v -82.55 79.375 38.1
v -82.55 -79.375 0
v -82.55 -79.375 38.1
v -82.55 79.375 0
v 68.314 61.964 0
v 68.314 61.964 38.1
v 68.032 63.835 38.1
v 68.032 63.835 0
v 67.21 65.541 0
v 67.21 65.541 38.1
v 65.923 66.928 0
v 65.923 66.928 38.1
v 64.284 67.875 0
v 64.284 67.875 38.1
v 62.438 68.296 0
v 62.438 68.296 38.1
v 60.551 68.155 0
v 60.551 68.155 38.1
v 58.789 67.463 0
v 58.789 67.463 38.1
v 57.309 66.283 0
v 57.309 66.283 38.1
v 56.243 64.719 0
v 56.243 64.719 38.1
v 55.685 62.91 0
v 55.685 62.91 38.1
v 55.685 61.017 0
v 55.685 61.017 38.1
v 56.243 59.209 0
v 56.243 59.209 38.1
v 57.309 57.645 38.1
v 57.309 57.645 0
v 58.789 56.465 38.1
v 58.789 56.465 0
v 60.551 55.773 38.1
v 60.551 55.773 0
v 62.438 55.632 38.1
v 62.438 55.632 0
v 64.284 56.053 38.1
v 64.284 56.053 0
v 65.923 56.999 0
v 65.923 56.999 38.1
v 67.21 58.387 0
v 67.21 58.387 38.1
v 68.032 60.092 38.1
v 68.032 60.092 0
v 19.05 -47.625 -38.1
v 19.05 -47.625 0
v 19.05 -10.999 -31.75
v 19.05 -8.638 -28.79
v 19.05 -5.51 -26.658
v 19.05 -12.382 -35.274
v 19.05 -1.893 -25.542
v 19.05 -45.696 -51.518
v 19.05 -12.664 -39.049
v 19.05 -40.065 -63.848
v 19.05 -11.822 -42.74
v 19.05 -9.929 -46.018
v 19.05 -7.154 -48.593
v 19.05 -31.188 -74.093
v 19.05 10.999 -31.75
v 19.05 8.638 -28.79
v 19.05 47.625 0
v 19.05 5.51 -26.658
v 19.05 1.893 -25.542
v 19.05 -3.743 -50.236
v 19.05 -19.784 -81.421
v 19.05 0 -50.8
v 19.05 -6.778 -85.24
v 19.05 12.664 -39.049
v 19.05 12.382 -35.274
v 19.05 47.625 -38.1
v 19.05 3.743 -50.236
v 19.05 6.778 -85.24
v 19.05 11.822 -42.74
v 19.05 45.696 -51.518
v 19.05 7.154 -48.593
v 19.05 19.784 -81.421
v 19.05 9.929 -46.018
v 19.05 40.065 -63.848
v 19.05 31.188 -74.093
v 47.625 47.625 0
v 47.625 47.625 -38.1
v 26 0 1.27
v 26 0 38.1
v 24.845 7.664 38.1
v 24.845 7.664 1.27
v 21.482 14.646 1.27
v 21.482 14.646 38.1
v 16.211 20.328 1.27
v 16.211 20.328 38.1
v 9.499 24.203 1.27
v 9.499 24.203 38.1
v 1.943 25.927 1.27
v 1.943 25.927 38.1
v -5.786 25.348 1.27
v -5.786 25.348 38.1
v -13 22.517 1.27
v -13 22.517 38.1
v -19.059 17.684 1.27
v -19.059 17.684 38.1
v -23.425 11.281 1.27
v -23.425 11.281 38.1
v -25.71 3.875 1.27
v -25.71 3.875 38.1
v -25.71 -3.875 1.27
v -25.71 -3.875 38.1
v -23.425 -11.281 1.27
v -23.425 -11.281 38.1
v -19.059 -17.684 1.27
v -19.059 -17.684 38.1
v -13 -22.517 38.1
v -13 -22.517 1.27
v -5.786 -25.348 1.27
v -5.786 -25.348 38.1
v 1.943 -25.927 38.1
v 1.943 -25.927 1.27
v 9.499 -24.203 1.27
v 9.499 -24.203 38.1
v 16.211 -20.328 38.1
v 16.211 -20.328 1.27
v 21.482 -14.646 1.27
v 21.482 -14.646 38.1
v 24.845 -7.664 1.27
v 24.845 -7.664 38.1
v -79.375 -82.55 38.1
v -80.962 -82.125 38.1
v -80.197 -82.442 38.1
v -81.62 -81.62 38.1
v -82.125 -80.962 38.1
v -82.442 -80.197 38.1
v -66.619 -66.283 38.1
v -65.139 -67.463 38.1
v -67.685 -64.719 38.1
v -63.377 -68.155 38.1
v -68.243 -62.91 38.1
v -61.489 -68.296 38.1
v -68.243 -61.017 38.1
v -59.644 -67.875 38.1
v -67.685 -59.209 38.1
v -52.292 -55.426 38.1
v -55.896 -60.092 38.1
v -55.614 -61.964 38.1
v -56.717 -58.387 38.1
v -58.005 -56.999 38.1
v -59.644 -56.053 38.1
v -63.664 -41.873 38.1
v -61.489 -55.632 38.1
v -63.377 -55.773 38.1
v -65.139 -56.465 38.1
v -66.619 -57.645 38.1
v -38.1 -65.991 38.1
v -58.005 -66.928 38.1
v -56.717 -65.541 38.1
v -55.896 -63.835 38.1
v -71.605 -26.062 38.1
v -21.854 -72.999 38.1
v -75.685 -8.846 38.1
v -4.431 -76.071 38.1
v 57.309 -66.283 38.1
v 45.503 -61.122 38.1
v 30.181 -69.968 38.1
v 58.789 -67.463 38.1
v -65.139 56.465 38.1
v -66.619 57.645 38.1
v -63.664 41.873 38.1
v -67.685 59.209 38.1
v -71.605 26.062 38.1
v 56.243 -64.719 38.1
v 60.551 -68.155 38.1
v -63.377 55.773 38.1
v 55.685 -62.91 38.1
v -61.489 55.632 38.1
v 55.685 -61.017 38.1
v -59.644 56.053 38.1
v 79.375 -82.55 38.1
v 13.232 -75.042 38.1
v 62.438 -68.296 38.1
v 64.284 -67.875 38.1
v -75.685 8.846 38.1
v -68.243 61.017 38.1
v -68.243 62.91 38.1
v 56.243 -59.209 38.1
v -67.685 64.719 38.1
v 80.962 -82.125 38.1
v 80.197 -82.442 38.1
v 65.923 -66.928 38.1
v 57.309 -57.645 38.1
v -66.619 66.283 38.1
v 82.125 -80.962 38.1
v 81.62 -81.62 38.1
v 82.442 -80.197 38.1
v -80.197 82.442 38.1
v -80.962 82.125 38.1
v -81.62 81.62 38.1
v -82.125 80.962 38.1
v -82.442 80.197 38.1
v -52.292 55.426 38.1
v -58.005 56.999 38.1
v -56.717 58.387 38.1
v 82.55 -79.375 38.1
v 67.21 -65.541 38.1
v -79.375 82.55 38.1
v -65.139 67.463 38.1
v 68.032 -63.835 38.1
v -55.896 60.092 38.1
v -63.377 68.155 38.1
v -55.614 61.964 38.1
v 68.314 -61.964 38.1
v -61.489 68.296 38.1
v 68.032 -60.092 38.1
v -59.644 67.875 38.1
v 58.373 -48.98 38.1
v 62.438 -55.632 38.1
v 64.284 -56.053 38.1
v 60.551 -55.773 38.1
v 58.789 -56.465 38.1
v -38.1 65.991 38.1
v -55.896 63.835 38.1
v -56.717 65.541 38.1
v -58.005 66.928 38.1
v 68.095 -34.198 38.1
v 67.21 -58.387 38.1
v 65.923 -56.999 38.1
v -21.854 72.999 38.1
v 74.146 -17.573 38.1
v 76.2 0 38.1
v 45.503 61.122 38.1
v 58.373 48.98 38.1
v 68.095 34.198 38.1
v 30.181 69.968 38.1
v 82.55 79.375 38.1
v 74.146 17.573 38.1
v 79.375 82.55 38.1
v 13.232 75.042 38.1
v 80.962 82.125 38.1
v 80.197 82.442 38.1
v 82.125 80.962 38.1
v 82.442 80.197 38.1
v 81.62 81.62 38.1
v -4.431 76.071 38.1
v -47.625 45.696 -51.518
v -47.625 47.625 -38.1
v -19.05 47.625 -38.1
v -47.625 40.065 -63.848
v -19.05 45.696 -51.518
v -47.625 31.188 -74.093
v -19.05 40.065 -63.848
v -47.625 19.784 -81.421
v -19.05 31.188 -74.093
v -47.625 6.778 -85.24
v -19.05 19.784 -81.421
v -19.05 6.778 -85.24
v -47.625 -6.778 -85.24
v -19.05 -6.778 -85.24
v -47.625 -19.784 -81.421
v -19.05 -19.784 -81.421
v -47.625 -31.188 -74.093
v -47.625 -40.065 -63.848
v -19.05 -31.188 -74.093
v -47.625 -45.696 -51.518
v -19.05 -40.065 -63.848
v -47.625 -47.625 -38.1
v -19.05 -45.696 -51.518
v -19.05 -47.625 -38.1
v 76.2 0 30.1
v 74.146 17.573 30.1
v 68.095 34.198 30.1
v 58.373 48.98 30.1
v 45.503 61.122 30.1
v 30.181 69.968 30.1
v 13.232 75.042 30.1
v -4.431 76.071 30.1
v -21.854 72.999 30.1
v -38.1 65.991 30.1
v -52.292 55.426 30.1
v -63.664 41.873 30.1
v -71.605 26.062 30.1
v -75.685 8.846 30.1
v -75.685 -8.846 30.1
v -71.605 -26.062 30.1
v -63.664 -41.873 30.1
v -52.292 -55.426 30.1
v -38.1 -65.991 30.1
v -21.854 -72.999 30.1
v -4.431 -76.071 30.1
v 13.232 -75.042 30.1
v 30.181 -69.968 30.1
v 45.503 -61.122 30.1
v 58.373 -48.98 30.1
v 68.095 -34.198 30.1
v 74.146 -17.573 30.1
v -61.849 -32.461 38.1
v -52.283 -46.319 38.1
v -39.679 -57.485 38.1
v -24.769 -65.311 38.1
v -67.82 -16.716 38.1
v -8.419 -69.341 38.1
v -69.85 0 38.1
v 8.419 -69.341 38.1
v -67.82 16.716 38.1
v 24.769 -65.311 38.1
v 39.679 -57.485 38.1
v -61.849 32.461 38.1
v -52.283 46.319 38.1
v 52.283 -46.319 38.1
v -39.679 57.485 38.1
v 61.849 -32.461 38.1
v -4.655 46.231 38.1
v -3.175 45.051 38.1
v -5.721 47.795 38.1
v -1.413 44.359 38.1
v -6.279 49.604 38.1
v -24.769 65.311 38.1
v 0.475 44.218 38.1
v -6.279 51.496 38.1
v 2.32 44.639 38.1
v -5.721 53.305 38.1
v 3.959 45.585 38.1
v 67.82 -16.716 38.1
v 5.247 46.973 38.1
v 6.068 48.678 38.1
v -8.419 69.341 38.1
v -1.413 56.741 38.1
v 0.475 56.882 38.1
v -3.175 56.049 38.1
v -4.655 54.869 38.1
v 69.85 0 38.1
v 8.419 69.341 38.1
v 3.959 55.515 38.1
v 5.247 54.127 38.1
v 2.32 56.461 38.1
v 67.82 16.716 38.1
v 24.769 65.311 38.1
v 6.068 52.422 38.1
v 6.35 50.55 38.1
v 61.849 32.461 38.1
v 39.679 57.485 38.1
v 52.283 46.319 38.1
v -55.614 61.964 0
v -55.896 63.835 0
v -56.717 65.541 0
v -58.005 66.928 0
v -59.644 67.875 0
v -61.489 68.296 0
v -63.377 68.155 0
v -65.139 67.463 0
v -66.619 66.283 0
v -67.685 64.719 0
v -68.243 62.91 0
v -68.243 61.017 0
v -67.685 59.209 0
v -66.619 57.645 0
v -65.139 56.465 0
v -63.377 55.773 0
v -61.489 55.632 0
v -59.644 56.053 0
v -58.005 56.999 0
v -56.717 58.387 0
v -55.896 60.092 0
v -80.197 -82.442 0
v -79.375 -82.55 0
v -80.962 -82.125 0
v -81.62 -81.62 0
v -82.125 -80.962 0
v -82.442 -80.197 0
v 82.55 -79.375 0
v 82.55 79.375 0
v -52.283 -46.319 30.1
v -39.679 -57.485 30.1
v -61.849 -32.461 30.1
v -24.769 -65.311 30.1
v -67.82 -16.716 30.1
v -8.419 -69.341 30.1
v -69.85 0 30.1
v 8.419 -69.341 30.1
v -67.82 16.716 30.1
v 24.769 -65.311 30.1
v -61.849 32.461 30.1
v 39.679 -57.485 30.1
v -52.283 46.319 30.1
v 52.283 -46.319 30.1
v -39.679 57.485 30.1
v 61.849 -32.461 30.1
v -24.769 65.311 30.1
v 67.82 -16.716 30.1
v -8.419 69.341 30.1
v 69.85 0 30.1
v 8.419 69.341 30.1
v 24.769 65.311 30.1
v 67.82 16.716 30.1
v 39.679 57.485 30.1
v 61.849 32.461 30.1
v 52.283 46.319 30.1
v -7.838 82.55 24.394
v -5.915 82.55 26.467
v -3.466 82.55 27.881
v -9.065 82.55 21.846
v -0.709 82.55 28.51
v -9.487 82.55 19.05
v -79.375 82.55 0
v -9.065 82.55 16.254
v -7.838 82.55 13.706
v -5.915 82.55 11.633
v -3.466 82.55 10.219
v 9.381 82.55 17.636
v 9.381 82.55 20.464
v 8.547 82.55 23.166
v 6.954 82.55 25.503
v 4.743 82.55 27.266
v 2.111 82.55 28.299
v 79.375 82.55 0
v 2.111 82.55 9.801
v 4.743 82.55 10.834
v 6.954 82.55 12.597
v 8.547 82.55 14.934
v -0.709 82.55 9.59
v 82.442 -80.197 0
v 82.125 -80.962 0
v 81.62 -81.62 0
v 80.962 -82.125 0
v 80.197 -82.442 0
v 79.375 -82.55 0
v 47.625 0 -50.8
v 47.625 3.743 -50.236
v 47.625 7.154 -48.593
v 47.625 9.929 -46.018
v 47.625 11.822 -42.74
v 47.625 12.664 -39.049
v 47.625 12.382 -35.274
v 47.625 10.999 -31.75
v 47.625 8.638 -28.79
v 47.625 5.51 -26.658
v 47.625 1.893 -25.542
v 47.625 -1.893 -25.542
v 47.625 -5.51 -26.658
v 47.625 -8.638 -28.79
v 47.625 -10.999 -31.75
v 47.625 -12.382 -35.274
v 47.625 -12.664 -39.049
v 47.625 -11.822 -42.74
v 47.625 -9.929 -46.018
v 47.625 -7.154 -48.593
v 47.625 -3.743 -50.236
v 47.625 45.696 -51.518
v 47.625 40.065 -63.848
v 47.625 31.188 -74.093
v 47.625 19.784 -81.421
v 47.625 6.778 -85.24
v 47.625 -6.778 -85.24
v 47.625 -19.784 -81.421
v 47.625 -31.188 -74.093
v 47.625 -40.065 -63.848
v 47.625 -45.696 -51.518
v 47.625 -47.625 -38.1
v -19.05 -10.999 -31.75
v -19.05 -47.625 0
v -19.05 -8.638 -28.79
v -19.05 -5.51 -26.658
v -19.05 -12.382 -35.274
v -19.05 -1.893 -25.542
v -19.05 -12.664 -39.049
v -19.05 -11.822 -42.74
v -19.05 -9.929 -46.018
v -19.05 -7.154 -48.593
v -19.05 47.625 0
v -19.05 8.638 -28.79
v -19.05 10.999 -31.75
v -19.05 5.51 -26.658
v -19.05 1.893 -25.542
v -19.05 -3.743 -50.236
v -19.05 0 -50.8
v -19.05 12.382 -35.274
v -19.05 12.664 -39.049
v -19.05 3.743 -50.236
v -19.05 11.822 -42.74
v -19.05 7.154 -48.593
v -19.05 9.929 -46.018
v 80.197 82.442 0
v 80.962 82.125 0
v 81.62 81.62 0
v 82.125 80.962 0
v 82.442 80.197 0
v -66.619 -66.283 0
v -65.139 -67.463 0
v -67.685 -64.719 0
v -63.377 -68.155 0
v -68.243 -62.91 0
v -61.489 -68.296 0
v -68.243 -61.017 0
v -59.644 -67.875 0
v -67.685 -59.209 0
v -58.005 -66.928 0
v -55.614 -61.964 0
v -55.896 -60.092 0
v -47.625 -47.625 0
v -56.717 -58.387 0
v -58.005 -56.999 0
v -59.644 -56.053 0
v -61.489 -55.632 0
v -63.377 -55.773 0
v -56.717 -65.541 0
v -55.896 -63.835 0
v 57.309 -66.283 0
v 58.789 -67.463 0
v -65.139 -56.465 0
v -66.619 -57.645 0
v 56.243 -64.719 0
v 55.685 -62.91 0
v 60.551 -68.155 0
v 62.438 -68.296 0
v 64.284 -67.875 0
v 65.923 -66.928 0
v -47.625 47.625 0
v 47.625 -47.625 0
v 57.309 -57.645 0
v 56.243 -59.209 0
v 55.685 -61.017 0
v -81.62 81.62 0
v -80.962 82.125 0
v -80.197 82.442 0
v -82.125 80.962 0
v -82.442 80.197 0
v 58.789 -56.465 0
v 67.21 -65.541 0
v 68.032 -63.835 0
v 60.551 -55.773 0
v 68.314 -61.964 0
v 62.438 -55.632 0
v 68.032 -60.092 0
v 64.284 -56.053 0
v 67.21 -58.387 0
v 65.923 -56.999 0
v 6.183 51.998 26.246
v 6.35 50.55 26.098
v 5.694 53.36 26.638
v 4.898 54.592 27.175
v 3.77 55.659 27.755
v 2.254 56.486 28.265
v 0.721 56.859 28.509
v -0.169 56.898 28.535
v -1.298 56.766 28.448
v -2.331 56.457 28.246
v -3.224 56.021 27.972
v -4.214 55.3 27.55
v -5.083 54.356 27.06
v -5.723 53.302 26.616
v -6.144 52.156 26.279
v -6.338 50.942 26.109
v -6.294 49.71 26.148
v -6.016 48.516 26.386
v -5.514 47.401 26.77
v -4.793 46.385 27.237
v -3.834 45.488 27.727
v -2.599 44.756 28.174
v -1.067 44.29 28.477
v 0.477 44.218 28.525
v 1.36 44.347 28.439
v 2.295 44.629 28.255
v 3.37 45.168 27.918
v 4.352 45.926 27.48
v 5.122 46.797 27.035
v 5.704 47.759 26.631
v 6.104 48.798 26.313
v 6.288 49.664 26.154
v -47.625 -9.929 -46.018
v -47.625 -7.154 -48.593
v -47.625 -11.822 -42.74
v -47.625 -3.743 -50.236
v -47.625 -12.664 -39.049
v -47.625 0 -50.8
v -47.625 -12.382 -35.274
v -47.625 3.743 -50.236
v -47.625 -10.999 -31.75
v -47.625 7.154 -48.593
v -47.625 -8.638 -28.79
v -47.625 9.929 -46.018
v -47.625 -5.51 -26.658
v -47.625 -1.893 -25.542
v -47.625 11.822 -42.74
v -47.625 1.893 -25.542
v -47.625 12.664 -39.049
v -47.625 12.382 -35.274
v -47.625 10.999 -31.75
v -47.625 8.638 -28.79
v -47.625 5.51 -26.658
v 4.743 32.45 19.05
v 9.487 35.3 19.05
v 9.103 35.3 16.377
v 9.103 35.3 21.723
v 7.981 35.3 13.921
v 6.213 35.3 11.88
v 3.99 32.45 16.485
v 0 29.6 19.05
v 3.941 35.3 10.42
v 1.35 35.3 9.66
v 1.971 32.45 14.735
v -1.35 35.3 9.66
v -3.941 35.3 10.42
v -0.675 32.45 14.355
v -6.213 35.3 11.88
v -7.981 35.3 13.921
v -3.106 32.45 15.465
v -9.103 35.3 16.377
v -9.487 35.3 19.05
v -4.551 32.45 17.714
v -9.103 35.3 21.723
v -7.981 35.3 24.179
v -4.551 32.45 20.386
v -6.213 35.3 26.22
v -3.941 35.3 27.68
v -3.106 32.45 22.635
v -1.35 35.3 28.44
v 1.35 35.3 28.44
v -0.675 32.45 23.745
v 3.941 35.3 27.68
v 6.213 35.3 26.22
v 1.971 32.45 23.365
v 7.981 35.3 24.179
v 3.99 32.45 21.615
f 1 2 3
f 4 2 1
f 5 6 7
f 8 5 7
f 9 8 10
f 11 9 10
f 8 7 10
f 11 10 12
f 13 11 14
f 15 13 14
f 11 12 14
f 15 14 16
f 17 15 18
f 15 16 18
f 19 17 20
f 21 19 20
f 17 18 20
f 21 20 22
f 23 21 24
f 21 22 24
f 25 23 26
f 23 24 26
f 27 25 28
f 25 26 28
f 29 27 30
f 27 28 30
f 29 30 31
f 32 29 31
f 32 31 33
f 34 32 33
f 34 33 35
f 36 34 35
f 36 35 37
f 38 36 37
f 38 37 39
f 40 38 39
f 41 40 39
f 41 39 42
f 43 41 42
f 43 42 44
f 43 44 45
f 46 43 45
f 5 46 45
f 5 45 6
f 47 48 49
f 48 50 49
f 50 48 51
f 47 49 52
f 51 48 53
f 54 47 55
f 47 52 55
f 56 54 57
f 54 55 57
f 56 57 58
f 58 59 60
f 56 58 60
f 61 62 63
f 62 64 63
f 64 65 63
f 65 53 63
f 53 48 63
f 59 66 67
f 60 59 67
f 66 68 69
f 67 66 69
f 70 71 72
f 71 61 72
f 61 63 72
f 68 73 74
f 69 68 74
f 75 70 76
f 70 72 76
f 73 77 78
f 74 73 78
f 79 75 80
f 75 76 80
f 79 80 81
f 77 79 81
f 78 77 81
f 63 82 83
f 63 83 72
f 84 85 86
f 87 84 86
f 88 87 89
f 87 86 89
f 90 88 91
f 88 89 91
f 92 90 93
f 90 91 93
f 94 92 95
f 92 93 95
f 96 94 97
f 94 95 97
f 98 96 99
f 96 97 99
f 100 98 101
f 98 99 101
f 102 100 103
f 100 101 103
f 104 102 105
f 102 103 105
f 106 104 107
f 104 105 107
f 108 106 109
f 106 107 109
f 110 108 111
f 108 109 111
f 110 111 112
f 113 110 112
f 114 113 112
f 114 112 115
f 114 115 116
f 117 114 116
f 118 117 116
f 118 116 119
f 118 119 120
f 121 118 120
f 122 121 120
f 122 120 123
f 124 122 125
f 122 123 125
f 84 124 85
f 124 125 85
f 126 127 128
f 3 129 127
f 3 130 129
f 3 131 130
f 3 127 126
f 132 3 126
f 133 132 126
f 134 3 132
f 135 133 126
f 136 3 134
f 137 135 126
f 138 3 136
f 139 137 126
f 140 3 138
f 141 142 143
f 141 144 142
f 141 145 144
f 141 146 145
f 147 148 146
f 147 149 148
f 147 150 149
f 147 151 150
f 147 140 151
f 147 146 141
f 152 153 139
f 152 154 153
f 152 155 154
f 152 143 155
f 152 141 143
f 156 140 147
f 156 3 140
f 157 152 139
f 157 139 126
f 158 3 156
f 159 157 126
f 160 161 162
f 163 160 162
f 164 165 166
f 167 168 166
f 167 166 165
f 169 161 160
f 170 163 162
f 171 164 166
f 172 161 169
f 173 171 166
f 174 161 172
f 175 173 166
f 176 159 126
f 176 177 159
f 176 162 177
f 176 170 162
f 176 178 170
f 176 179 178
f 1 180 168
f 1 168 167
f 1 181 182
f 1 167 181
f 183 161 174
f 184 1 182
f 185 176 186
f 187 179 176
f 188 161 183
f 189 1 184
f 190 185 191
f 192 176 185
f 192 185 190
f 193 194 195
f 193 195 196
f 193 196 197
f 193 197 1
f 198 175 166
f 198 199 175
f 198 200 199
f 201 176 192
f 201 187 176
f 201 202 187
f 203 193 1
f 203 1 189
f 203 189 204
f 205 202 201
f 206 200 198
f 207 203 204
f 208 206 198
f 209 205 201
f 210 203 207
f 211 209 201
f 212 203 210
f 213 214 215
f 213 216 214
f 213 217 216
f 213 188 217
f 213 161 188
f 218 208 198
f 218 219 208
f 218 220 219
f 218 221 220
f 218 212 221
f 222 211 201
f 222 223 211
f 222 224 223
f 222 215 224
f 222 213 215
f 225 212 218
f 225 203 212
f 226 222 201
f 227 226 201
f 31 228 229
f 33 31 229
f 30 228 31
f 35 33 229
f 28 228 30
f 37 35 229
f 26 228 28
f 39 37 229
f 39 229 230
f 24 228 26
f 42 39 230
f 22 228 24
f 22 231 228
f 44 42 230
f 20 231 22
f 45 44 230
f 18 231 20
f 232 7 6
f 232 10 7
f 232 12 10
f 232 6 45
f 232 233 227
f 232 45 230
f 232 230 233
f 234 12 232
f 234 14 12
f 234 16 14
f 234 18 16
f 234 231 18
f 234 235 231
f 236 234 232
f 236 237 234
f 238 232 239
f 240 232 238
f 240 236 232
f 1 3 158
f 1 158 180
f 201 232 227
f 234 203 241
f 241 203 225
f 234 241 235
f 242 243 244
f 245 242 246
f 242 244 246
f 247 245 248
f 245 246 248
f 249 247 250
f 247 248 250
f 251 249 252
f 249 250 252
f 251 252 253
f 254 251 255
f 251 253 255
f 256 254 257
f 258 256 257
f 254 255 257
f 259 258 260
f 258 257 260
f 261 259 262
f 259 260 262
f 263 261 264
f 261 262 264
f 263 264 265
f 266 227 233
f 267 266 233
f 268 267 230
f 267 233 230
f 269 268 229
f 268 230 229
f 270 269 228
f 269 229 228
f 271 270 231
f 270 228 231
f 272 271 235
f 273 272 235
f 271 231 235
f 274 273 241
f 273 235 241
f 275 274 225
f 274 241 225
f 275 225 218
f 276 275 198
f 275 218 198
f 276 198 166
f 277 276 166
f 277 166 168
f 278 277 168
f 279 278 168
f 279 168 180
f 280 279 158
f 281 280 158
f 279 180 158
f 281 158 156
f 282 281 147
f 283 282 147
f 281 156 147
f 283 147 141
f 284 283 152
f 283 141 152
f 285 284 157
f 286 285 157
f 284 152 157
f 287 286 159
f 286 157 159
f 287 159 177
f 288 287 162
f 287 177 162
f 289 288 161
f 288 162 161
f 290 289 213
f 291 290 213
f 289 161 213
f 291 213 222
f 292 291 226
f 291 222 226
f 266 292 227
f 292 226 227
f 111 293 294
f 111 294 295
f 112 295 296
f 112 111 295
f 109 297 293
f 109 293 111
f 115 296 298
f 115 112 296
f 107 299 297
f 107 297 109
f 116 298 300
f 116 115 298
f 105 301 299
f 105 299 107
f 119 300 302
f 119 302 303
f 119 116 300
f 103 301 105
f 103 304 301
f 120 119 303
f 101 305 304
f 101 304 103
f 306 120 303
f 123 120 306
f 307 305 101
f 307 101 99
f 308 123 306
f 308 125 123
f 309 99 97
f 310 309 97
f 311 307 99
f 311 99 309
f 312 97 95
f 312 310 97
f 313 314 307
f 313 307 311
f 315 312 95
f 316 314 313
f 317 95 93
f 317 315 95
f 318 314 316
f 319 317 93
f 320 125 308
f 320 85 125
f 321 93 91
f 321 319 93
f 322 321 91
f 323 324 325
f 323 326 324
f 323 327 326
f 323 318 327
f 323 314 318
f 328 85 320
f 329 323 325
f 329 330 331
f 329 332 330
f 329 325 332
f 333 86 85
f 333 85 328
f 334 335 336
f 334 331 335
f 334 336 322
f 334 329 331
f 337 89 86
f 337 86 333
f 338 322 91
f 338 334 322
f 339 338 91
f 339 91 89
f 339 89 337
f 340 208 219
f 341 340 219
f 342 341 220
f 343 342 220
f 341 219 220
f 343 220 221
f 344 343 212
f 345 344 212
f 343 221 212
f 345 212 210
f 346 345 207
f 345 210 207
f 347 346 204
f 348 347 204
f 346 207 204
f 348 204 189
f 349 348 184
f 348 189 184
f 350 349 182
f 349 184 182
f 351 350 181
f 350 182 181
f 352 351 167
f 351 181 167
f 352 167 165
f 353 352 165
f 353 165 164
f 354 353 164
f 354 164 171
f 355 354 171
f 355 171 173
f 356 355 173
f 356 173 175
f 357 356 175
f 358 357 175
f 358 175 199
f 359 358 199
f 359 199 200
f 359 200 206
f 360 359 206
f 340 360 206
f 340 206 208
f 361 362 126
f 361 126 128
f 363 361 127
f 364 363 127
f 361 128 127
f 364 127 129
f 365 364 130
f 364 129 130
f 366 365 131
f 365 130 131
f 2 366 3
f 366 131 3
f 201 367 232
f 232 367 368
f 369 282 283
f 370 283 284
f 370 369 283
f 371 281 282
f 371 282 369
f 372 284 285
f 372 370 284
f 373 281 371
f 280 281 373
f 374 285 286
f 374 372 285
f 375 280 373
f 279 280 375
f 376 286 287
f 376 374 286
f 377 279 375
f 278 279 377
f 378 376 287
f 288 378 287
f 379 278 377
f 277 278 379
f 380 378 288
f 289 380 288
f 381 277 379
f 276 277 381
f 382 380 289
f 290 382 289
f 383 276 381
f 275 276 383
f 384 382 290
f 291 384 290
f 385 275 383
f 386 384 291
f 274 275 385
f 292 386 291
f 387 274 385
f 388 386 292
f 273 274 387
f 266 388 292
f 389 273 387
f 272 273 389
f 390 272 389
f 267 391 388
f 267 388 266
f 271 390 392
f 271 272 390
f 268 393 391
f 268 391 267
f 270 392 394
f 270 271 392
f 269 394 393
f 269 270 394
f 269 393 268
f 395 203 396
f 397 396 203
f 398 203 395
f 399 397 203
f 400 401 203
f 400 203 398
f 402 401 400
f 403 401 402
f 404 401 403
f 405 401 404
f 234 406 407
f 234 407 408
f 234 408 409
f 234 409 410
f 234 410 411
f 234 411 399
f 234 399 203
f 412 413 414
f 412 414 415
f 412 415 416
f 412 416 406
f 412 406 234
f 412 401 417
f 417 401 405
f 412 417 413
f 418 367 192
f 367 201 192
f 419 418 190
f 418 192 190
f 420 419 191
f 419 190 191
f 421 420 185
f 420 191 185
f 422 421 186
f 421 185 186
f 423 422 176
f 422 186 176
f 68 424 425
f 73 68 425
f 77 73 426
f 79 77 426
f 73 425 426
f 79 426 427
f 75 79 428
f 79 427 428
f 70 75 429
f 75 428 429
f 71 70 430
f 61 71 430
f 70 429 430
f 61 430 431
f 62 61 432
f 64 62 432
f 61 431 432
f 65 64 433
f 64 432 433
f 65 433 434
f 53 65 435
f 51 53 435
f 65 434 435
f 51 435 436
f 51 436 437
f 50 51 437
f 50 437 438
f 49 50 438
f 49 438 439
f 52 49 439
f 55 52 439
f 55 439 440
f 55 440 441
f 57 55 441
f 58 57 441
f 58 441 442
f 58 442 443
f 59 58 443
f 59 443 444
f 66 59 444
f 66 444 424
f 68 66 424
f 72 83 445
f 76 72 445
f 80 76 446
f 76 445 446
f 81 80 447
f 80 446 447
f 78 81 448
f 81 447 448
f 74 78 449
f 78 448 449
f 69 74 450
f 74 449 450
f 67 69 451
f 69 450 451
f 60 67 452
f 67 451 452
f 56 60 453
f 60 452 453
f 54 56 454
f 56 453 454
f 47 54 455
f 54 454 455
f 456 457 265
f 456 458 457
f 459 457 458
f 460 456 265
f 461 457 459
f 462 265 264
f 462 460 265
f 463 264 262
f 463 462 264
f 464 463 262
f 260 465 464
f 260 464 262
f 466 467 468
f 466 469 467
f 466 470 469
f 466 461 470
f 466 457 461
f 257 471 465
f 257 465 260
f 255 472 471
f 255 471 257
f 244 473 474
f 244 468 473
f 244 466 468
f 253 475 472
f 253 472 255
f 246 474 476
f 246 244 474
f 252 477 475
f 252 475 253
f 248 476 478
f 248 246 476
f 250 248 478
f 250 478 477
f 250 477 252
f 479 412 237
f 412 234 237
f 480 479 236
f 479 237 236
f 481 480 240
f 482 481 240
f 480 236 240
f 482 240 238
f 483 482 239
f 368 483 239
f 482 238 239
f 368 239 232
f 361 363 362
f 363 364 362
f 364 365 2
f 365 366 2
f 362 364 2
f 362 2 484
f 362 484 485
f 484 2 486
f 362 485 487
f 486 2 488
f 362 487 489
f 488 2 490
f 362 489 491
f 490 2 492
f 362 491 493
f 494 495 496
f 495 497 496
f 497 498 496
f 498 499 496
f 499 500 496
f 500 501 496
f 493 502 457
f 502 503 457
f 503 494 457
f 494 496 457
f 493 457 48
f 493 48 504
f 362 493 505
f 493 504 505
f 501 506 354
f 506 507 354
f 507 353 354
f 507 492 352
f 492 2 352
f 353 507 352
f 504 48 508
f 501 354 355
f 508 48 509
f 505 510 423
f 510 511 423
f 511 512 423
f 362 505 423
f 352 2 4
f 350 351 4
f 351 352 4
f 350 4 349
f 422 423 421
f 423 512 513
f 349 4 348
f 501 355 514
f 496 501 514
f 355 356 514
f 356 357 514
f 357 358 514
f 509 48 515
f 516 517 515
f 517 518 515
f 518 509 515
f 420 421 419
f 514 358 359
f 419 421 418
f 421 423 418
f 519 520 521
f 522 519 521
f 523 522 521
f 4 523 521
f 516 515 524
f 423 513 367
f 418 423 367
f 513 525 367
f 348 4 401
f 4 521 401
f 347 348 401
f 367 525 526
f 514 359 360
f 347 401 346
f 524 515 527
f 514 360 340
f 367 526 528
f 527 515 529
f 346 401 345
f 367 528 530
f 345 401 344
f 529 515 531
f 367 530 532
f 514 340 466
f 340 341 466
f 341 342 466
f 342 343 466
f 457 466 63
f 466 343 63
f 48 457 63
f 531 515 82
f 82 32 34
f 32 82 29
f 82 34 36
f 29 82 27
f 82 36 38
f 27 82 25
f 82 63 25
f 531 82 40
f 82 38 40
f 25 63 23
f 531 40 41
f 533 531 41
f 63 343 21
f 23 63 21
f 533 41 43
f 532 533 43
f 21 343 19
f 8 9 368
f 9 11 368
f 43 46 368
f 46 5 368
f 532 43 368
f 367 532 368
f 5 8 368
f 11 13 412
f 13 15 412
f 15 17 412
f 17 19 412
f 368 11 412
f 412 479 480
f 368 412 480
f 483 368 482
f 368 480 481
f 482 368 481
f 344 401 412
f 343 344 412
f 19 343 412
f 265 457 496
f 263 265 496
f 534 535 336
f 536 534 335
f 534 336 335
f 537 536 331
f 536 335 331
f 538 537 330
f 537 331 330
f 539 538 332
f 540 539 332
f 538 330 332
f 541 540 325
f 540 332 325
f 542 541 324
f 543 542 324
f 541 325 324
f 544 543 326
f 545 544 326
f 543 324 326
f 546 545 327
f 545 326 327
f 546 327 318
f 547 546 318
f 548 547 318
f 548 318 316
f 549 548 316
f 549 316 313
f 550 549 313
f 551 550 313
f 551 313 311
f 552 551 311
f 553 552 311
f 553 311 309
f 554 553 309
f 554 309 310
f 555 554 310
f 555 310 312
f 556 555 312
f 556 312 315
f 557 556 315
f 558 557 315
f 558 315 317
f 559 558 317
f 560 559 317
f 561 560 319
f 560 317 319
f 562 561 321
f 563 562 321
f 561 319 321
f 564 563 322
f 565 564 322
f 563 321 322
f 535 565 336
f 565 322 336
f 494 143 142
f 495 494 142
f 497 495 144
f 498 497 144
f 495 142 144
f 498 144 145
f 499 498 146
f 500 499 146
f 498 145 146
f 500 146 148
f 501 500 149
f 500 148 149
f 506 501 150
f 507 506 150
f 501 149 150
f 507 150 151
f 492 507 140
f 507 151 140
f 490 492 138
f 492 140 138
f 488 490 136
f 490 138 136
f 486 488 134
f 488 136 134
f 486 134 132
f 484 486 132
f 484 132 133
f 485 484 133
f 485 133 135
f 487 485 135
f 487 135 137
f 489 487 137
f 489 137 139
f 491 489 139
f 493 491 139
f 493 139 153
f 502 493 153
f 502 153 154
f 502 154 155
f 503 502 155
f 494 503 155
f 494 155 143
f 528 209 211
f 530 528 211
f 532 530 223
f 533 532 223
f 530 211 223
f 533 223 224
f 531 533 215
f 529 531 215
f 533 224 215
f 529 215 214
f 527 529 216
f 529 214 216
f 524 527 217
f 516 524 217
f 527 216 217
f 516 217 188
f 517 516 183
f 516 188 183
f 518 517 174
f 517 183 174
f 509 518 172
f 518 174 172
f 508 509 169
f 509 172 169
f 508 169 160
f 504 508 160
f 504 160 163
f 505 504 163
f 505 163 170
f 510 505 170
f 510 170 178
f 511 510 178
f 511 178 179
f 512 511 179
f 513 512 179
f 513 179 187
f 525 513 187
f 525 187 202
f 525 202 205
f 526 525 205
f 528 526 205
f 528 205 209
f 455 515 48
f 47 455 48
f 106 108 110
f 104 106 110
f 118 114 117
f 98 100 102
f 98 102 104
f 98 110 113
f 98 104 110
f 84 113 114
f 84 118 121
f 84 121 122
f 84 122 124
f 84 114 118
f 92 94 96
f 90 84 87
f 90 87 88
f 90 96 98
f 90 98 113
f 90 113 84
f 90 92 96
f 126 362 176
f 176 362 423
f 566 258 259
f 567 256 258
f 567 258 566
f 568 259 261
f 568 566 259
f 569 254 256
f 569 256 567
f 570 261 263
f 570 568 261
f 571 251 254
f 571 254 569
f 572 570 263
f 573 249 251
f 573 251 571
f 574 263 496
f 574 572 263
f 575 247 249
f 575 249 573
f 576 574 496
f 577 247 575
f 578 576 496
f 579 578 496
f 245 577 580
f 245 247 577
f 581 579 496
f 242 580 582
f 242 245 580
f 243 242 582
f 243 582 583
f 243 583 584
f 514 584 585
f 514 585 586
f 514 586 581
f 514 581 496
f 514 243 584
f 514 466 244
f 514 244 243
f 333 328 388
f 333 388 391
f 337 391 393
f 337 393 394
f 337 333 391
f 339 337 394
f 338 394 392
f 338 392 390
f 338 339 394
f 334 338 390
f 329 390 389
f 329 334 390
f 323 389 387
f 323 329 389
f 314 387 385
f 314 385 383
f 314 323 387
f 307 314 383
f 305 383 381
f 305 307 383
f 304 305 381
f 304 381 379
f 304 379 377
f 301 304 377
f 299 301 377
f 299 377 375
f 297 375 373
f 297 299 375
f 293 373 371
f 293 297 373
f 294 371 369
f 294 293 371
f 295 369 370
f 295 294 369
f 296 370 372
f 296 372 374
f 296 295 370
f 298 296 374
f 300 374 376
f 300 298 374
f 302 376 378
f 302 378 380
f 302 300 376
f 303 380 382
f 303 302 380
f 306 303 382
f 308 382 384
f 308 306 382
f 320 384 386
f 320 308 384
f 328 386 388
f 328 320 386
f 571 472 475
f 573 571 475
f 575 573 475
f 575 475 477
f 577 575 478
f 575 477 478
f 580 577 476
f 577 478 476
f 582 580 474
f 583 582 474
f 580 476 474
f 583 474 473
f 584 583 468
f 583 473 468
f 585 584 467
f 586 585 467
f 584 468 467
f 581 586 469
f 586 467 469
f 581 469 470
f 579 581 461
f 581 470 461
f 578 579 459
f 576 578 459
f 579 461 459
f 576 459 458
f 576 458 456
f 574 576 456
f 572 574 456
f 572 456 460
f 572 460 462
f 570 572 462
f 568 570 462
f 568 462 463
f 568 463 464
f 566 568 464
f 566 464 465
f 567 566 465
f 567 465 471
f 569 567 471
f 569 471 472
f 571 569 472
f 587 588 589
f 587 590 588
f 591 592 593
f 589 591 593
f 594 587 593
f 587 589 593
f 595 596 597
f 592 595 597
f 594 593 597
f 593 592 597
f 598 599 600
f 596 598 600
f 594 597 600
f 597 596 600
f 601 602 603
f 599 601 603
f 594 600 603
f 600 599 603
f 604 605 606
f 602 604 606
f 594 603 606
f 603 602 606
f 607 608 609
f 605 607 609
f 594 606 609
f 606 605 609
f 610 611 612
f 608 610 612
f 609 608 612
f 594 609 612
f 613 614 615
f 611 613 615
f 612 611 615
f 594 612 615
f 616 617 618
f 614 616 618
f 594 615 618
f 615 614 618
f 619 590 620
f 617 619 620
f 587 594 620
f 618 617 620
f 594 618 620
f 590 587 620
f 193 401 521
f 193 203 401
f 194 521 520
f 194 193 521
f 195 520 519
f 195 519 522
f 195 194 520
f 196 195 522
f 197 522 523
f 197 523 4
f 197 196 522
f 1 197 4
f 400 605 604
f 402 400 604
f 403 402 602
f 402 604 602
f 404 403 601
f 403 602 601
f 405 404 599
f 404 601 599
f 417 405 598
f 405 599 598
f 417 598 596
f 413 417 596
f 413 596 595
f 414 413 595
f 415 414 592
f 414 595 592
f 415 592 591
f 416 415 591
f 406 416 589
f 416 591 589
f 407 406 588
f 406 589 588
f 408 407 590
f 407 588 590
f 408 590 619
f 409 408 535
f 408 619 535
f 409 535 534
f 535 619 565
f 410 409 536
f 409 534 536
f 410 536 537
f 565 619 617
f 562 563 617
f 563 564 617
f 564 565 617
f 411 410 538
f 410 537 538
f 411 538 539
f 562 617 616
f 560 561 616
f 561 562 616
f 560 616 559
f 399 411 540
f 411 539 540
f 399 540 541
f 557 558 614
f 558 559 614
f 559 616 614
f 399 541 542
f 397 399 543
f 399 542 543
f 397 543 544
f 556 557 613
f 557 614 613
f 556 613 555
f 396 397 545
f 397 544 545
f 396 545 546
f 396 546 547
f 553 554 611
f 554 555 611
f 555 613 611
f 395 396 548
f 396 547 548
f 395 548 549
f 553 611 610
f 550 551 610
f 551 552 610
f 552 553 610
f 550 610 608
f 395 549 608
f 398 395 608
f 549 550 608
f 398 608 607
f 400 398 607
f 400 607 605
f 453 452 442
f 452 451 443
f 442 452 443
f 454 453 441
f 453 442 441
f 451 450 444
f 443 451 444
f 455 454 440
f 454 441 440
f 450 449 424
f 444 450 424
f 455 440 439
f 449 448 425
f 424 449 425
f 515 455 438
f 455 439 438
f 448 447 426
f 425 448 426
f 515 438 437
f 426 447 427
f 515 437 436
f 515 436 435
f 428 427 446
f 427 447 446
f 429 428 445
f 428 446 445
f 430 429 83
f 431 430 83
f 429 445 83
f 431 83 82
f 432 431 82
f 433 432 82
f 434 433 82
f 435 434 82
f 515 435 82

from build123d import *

# Parameters (mm, degrees)
SKETCH1_W                        = 165.1
SKETCH1_H                        = 165.1
BOSS_EXTRUDE1_DEPTH              = 38.1
SKETCH2_W                        = 95.25
SKETCH2_H                        = 95.25
BOSS_EXTRUDE2_DEPTH              = 38.1
BOSS_EXTRUDE3_DEPTH              = 95.25
SKETCH4_R                        = 12.7
CUT_EXTRUDE1_DEPTH               = 177.376894037
SKETCH5_W                        = 38.1
SKETCH5_H                        = 85.725
CUT_EXTRUDE2_DEPTH               = 177.376894037
FILLET1_R                        = 3.175
SKETCH6_R                        = 26
CUT_EXTRUDE3_DEPTH               = 36.83
SKETCH7_R                        = 76.2
SKETCH7_R_2                      = 69.85
CUT_EXTRUDE4_DEPTH               = 8
F_1_2_14_NPSM_TAPPED_HOLE1_D     = 18.9738
F_1_2_14_NPSM_TAPPED_HOLE1_DEPTH = 47.25
F_1_2_14_NPSM_TAPPED_HOLE1_TIP   = 5.700304607
SKETCH11_R                       = 6.35
CUT_EXTRUDE5_DEPTH               = 20
SKETCH12_R                       = 6.35
CUT_EXTRUDE6_DEPTH               = 171.181184746


with BuildPart() as part:
    # Sketch1 → Boss-Extrude1 (new body)
    with BuildSketch(Plane.XY):
        Rectangle(SKETCH1_W, SKETCH1_H)
    extrude(amount=BOSS_EXTRUDE1_DEPTH)

    # Sketch2 → Boss-Extrude2 (add)
    with BuildSketch(Plane(origin=(0, 0, 0), x_dir=(-1, 0, 0), z_dir=(0, 0, -1))):
        Rectangle(SKETCH2_W, SKETCH2_H)
    extrude(amount=BOSS_EXTRUDE2_DEPTH)

    # Sketch3 → Boss-Extrude3 (add)
    with BuildSketch(Plane(origin=(47.625, 0, 0), x_dir=(0, 0, -1), z_dir=(1, 0, 0))):
        with BuildLine():
            Line((38.1, -47.625), (38.1, 47.625))
            ThreePointArc((38.1, 47.625), (85.725, 0), (38.1, -47.625))
        make_face()
    extrude(amount=-BOSS_EXTRUDE3_DEPTH)

    # Sketch4 → Cut-Extrude1 (cut, through all)
    with BuildSketch(Plane(origin=(47.625, 0, 0), x_dir=(0, 0, -1), z_dir=(1, 0, 0))):
        with Locations((38.1, 0)):
            Circle(SKETCH4_R)
    extrude(amount=-CUT_EXTRUDE1_DEPTH, mode=Mode.SUBTRACT)

    # Sketch5 → Cut-Extrude2 (cut, through all)
    with BuildSketch(Plane(origin=(0, 47.625, 0), x_dir=(1, 0, 0), z_dir=(0, 1, 0))):
        with Locations((0, 42.8625)):
            Rectangle(SKETCH5_W, SKETCH5_H)
    extrude(amount=-CUT_EXTRUDE2_DEPTH, mode=Mode.SUBTRACT)

    # Fillet1
    fillet1_edges = [part.edges().sort_by_distance(p)[0] for p in [
        (-82.55, 82.55, 19.05),
        (82.55, 82.55, 19.05),
        (82.55, -82.55, 19.05),
        (-82.55, -82.55, 19.05),
    ]]
    fillet(fillet1_edges, radius=FILLET1_R)

    # Sketch6 → Cut-Extrude3 (cut)
    with BuildSketch(Plane.XY.offset(38.1)):
        Circle(SKETCH6_R)
    extrude(amount=-CUT_EXTRUDE3_DEPTH, mode=Mode.SUBTRACT)

    # Sketch7 → Cut-Extrude4 (cut)
    with BuildSketch(Plane.XY.offset(38.1)):
        Circle(SKETCH7_R)
        Circle(SKETCH7_R_2, mode=Mode.SUBTRACT)
    extrude(amount=-CUT_EXTRUDE4_DEPTH, mode=Mode.SUBTRACT)

    # 1/2-14 NPSM Tapped Hole1
    with Locations(Plane(origin=(0, 82.55, 0), x_dir=(1, 0, 0), z_dir=(0, 1, 0))):
        with Locations((0, -19.05)):
            Hole(F_1_2_14_NPSM_TAPPED_HOLE1_D / 2, depth=F_1_2_14_NPSM_TAPPED_HOLE1_DEPTH)
            with Locations((0, 0, -(F_1_2_14_NPSM_TAPPED_HOLE1_DEPTH + F_1_2_14_NPSM_TAPPED_HOLE1_TIP / 2))):  # 118° drill point
                Cone(0, F_1_2_14_NPSM_TAPPED_HOLE1_D / 2, F_1_2_14_NPSM_TAPPED_HOLE1_TIP, mode=Mode.SUBTRACT)

    # Sketch11 → Cut-Extrude5 (cut)
    with BuildSketch(Plane.XY.offset(38.1)):
        with Locations((0, 50.55)):
            Circle(SKETCH11_R)
    extrude(amount=-CUT_EXTRUDE5_DEPTH, mode=Mode.SUBTRACT)

    # Sketch12 → Cut-Extrude6 (cut, through all)
    with BuildSketch(Plane.XY.offset(38.1)):
        with Locations((-61.963767235, 61.963767235)):
            Circle(SKETCH12_R)
        with Locations((61.963767235, 61.963767235)):
            Circle(SKETCH12_R)
        with Locations((61.963767235, -61.963767235)):
            Circle(SKETCH12_R)
        with Locations((-61.963767235, -61.963767235)):
            Circle(SKETCH12_R)
    extrude(amount=-CUT_EXTRUDE6_DEPTH, mode=Mode.SUBTRACT)


solid = part.part
